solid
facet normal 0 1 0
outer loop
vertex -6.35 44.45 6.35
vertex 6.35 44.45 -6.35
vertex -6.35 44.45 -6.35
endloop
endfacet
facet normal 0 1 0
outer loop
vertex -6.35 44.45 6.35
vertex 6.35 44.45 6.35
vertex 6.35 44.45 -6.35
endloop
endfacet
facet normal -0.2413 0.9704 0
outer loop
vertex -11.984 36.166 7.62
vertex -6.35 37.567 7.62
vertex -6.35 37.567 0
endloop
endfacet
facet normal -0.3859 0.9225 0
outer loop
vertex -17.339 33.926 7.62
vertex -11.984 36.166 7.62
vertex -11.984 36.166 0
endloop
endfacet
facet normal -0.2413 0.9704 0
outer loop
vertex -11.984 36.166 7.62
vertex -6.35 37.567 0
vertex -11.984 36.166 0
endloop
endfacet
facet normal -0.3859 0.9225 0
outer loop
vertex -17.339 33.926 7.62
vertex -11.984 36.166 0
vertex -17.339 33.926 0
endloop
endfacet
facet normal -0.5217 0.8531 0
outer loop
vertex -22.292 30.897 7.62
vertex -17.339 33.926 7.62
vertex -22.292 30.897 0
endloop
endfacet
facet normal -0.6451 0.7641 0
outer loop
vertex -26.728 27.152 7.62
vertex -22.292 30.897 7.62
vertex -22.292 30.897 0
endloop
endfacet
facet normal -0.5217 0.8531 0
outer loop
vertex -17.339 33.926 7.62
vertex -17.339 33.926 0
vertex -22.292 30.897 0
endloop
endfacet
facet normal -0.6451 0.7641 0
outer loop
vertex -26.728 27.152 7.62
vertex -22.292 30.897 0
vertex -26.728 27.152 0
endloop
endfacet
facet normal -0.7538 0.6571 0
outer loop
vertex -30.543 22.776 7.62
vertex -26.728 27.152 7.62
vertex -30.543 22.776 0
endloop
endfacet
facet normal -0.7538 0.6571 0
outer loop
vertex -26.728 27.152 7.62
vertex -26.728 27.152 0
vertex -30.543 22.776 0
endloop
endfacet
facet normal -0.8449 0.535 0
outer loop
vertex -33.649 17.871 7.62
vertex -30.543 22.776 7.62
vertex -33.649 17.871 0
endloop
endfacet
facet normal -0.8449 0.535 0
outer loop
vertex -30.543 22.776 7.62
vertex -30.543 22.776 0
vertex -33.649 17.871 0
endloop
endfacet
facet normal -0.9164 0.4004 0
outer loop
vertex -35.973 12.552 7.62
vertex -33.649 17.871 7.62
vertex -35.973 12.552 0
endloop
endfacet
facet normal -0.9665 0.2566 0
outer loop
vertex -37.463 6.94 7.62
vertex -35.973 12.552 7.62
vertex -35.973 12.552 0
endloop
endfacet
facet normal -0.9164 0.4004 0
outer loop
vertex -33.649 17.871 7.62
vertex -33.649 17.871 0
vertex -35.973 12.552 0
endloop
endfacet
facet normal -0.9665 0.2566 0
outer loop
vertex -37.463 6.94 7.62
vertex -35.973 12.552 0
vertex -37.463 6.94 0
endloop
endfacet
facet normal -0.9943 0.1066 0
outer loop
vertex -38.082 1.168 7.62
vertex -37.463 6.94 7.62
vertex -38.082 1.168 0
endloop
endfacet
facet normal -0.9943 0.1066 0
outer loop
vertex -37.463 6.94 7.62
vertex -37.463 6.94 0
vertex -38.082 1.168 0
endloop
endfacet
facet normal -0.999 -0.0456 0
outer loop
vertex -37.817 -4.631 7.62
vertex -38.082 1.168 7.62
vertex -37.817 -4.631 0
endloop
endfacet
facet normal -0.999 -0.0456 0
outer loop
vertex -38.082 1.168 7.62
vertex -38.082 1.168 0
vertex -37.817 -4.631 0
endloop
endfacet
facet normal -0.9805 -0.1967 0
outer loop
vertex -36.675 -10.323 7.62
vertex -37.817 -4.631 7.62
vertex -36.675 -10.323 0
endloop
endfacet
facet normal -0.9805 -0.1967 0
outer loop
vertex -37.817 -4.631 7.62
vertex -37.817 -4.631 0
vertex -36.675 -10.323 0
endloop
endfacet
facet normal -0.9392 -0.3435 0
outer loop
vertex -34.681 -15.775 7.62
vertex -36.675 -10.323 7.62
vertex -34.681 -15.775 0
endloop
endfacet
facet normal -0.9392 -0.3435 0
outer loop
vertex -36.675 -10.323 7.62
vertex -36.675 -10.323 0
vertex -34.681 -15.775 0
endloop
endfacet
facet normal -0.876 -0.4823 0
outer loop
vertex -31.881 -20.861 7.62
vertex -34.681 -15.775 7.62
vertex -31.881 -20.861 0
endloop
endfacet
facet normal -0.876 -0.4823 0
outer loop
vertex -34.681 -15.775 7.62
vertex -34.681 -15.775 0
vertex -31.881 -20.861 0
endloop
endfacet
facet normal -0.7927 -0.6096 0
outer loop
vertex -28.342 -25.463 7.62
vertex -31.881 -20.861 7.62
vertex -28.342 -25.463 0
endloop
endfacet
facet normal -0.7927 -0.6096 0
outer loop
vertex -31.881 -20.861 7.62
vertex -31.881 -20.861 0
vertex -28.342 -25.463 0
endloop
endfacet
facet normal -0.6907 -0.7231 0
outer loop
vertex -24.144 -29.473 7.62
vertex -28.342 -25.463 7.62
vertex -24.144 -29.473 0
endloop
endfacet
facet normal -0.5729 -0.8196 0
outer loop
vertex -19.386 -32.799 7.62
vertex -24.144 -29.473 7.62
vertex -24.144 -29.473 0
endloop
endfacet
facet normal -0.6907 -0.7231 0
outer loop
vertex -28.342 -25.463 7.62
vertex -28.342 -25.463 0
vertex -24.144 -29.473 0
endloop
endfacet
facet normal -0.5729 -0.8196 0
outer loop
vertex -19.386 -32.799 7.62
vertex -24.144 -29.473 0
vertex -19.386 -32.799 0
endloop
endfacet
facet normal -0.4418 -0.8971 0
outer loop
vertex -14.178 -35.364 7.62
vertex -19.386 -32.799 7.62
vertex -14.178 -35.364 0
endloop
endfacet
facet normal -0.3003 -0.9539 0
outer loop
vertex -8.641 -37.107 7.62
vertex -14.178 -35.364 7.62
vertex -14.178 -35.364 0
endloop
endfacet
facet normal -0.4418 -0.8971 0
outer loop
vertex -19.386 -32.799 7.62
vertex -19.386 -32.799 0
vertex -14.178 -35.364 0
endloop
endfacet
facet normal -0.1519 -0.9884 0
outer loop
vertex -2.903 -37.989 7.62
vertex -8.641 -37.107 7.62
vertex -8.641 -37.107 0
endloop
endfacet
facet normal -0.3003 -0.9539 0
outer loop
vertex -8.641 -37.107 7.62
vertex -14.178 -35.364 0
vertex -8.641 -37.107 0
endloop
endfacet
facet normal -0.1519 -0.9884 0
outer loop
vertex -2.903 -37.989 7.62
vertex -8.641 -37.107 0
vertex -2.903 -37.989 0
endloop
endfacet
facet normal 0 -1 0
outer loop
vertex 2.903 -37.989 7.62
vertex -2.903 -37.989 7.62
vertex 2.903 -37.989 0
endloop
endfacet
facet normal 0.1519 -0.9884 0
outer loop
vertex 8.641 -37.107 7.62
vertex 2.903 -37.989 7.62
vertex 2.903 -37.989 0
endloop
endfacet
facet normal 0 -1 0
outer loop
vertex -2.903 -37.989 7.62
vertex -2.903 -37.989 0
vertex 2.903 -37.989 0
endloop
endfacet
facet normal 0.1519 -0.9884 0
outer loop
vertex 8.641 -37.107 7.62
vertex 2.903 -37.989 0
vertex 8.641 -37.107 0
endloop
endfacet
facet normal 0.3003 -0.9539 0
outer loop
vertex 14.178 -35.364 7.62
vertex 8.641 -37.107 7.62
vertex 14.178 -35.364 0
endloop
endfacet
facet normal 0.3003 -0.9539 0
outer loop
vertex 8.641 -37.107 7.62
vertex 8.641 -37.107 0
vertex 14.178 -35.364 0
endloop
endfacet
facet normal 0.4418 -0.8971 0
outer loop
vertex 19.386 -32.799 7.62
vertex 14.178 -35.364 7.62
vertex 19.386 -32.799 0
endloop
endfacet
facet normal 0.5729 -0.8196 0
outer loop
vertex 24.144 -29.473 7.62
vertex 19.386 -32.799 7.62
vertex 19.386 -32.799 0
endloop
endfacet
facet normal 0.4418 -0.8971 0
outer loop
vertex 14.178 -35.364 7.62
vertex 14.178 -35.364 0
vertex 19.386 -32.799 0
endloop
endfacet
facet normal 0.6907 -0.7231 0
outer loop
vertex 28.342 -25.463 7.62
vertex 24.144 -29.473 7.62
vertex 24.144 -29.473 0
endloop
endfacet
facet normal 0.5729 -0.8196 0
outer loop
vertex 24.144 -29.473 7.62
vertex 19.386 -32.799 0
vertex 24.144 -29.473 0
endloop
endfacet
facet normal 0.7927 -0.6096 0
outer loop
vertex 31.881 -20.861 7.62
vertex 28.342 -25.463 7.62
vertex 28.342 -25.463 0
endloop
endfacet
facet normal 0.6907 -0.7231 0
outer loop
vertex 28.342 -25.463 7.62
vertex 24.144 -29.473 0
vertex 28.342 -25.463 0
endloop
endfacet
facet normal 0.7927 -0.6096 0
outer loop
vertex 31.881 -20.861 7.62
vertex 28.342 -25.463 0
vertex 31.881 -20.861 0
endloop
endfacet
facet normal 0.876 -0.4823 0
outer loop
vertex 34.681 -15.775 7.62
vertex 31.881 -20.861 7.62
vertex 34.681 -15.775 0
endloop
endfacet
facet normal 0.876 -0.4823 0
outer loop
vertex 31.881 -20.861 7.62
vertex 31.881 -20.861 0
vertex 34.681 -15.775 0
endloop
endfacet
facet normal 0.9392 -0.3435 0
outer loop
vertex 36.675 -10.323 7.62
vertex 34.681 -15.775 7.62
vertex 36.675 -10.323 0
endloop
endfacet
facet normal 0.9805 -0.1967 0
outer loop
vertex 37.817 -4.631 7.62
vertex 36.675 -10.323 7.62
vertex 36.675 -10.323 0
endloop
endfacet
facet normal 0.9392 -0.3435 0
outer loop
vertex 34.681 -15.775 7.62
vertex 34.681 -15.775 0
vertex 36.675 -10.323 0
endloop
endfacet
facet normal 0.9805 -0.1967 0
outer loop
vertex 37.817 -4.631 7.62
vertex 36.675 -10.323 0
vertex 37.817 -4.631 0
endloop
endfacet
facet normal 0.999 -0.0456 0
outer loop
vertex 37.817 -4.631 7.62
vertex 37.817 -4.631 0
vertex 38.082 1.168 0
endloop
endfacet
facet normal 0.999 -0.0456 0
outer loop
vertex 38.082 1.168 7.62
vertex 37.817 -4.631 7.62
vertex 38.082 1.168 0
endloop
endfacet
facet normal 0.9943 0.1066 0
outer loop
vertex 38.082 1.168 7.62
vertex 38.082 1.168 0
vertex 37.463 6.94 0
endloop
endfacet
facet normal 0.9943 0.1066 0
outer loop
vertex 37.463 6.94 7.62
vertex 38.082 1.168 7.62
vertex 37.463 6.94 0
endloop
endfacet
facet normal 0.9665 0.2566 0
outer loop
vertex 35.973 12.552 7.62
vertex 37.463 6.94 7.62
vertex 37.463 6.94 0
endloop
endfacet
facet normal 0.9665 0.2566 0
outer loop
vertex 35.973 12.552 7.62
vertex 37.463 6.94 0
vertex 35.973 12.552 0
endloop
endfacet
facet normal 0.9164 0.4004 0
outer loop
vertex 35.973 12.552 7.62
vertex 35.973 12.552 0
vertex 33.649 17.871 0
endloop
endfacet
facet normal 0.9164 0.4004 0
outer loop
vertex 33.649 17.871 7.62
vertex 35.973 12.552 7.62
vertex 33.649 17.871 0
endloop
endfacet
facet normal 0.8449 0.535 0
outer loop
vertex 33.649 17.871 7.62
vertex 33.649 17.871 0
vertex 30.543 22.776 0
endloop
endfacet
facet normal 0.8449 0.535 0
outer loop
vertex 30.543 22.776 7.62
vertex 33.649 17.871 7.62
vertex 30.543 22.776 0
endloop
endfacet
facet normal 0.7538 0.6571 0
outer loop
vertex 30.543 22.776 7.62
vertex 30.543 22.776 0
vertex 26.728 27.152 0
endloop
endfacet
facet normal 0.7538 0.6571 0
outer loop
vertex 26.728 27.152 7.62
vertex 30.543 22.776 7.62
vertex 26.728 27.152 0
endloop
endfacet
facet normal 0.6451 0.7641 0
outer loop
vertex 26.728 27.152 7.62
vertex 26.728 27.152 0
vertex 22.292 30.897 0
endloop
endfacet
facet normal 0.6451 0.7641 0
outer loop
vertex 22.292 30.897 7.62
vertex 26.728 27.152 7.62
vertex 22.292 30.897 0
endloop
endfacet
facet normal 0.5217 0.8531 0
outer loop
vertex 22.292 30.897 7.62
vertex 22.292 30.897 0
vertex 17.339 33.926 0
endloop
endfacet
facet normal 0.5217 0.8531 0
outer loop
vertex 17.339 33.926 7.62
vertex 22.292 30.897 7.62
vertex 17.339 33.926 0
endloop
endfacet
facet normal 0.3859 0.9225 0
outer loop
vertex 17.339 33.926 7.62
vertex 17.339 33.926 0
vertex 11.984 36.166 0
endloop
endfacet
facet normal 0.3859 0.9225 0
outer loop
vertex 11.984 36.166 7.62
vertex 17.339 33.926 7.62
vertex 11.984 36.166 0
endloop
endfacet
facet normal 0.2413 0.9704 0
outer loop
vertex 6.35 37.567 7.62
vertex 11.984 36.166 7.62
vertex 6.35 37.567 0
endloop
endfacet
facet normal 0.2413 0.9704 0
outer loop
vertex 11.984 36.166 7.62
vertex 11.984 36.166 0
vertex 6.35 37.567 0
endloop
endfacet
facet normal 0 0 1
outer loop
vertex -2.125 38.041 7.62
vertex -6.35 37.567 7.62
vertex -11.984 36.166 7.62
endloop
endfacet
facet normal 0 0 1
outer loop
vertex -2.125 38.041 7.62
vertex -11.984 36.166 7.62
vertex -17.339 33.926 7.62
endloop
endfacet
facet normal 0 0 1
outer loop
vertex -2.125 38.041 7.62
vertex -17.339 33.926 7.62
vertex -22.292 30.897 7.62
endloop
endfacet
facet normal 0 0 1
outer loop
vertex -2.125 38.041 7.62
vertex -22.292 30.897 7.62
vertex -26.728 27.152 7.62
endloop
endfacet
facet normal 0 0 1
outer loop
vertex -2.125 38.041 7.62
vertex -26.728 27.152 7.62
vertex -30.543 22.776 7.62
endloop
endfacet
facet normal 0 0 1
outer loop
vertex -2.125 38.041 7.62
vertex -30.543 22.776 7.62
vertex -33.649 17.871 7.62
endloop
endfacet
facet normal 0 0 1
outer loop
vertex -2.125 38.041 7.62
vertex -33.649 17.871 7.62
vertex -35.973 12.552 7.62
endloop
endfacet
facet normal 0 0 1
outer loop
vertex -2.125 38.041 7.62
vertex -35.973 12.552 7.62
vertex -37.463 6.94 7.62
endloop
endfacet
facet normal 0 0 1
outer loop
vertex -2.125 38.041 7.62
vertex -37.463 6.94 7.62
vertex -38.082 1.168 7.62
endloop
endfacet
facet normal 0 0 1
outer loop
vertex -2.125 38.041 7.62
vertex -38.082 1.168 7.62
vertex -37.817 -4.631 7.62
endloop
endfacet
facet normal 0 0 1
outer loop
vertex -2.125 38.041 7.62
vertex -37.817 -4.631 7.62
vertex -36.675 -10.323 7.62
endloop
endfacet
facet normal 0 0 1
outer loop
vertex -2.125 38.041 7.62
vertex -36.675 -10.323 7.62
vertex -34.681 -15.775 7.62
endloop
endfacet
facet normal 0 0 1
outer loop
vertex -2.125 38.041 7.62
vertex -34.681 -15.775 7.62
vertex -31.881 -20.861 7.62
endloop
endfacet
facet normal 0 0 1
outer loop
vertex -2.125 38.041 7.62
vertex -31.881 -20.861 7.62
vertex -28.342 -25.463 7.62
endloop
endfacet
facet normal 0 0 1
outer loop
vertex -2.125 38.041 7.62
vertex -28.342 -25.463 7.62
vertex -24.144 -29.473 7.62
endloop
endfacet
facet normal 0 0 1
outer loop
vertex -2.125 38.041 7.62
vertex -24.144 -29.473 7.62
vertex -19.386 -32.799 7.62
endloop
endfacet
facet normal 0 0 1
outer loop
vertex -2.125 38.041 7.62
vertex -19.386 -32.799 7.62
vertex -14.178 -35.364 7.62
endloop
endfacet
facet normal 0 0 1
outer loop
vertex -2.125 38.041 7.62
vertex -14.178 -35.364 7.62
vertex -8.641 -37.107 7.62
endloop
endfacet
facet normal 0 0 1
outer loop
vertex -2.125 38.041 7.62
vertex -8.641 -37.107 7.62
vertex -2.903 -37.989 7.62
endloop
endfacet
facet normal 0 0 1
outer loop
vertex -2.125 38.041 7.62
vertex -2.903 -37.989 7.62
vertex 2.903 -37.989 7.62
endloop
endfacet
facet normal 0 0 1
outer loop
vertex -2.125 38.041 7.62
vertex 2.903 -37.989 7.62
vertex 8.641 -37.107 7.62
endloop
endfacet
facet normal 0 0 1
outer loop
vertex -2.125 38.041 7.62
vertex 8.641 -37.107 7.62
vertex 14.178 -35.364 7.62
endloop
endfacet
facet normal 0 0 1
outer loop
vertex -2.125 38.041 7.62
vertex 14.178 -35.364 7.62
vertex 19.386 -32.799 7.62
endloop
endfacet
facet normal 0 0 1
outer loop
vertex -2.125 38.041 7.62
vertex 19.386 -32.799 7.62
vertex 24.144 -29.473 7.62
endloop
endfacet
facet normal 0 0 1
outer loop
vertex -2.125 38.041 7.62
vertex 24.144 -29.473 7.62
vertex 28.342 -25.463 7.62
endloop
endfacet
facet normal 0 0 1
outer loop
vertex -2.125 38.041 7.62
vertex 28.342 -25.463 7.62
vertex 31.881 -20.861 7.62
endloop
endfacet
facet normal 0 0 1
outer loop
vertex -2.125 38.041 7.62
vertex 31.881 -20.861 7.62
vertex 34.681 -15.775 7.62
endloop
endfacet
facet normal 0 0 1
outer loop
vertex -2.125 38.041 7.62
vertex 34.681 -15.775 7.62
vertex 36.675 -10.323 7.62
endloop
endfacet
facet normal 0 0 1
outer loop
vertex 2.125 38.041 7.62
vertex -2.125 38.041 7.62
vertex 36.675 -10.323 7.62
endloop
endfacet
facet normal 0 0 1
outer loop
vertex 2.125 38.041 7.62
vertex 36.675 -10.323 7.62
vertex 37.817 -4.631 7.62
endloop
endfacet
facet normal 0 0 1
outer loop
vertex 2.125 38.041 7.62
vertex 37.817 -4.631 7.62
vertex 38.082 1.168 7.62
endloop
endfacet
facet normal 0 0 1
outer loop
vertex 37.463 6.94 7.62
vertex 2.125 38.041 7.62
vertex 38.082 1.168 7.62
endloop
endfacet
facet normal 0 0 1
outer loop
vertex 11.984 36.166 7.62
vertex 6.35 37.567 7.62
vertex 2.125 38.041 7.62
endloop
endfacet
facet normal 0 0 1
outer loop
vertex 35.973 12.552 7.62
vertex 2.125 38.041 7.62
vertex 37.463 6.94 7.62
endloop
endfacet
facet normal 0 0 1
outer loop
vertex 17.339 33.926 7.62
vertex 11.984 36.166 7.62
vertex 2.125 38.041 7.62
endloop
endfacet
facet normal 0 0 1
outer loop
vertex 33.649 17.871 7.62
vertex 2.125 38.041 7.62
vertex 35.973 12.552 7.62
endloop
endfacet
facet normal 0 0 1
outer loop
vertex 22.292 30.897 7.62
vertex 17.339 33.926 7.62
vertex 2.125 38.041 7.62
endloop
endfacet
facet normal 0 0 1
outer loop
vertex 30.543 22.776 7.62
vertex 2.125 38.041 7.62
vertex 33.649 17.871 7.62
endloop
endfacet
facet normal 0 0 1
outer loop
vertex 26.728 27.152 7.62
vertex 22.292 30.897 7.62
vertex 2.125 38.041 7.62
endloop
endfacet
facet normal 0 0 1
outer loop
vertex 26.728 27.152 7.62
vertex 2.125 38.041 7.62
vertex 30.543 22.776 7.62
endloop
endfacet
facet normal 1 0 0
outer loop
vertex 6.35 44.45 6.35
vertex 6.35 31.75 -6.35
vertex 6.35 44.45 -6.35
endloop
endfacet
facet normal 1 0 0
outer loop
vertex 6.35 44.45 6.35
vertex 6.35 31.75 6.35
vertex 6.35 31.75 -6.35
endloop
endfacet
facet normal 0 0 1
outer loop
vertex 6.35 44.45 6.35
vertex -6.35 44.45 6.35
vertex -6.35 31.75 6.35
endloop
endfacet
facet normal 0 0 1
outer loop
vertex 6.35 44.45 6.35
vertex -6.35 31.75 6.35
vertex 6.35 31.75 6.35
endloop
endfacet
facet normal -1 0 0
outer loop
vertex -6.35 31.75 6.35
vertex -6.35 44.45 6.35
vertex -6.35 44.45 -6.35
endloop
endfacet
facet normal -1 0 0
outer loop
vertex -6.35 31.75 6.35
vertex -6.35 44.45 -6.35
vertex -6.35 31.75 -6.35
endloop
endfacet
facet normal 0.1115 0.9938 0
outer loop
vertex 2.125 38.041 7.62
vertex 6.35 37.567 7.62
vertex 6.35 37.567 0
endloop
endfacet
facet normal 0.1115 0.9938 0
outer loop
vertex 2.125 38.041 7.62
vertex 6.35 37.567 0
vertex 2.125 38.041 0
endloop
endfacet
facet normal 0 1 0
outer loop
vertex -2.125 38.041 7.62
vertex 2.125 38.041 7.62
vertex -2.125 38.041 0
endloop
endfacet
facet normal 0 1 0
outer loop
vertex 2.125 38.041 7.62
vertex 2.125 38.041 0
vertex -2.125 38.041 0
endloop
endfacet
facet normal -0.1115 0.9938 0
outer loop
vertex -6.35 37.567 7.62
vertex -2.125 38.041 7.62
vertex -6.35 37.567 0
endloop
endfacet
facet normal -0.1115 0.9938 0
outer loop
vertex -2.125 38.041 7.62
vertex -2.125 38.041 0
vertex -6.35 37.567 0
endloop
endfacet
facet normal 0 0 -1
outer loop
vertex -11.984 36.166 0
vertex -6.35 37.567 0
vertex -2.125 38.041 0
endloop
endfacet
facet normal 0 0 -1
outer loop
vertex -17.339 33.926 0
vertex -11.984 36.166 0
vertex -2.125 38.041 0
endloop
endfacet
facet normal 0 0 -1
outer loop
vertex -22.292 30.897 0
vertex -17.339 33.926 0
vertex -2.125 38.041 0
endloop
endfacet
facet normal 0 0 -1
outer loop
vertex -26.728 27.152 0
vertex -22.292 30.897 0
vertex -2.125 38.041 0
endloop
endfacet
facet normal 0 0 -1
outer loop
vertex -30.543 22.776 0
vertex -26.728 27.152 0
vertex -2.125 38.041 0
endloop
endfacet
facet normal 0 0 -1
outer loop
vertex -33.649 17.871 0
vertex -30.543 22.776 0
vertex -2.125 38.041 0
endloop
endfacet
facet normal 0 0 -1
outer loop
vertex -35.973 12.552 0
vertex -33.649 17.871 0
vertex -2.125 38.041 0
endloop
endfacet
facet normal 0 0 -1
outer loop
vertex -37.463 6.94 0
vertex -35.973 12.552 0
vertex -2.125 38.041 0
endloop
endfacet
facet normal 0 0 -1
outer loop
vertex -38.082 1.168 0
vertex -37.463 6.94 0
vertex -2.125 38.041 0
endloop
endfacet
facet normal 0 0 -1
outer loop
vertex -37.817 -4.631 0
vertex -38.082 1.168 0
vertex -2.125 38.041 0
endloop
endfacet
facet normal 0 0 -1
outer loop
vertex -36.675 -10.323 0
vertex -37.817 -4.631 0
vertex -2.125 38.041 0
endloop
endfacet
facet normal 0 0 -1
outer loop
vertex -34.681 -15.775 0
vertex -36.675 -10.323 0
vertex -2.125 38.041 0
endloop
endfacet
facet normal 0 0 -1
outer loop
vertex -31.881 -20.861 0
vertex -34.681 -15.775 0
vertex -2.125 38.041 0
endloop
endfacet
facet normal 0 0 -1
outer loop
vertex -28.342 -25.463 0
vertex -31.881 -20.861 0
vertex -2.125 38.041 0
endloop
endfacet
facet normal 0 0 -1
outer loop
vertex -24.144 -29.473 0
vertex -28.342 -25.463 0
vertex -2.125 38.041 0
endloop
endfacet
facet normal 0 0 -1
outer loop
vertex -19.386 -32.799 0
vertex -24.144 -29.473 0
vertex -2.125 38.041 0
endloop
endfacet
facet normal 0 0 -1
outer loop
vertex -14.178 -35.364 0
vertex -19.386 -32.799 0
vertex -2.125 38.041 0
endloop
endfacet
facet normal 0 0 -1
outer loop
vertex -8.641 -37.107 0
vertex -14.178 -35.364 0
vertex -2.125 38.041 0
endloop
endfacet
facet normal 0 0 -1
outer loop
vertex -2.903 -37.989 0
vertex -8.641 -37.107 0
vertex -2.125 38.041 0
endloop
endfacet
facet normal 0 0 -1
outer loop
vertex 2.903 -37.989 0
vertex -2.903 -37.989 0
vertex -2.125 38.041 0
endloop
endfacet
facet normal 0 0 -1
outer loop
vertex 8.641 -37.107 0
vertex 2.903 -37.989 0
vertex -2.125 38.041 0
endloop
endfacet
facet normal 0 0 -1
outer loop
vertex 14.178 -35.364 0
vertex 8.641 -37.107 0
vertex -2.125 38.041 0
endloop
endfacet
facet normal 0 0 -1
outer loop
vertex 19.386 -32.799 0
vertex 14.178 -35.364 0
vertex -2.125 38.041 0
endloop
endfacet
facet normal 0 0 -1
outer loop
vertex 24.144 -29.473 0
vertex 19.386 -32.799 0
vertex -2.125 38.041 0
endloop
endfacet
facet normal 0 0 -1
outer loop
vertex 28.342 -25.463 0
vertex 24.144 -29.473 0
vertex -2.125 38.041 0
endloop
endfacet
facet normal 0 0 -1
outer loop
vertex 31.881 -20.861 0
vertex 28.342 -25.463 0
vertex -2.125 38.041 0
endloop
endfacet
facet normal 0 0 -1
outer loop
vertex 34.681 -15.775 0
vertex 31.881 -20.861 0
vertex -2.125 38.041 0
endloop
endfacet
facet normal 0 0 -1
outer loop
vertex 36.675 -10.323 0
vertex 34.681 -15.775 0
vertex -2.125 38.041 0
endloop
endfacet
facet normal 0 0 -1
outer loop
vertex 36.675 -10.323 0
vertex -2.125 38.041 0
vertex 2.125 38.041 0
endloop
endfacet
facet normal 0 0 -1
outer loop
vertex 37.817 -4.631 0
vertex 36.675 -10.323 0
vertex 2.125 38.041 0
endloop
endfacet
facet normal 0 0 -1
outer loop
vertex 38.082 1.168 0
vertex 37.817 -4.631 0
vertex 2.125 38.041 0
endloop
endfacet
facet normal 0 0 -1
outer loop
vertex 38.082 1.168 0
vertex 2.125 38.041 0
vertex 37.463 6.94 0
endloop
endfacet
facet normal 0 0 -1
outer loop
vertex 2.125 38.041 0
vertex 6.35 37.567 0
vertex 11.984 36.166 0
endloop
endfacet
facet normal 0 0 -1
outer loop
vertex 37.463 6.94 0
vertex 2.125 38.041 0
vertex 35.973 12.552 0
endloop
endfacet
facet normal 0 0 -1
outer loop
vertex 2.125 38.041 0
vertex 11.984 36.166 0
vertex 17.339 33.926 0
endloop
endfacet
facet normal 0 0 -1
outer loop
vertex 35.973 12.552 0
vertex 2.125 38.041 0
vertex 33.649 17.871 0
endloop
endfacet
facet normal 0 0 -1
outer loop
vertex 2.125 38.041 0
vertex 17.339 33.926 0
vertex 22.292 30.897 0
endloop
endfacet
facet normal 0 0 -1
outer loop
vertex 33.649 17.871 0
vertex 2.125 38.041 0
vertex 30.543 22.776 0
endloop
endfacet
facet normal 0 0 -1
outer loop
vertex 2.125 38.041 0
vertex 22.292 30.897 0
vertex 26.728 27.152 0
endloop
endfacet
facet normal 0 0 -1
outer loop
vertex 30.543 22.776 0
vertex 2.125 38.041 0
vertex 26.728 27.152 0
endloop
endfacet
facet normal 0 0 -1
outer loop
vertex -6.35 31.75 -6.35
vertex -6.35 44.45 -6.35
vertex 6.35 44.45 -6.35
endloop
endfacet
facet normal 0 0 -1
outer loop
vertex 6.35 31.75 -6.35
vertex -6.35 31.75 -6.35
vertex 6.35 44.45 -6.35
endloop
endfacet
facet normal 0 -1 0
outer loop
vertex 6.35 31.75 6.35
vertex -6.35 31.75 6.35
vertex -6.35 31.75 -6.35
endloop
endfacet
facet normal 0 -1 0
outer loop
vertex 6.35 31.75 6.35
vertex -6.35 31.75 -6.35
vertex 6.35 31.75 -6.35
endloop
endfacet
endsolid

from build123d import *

# Parameters (mm, degrees)
F1_DEPTH = 7.62
F2_DEPTH = 6.35


with BuildPart() as f1:
    # F0 (on Top) → F1 (new body)
    with BuildSketch(Plane.XY):
        with BuildLine():
            Line((6.35, 31.75), (6.35, 37.5671066227))
            ThreePointArc((6.35, 37.5671066227), (0, 38.1), (-6.35, 37.5671066227))
            Line((-6.35, 37.5671066227), (-6.35, 31.75))
            Line((-6.35, 31.75), (6.35, 31.75))
        make_face()
        with BuildLine():
            ThreePointArc((-6.35, 37.5671066227), (-24.5934442484, -29.099355663), (38.1, 0))
            ThreePointArc((38.1, 0), (29.099355663, 24.5934442484), (6.35, 37.5671066227))
            Line((6.35, 37.5671066227), (6.35, 31.75))
            Line((6.35, 31.75), (-6.35, 31.75))
            Line((-6.35, 31.75), (-6.35, 37.5671066227))
        make_face()
    extrude(amount=F1_DEPTH)


with BuildPart() as f2:
    # F0 (on Top) → F2 (new body, symmetric)
    with BuildSketch(Plane.XY):
        with BuildLine():
            ThreePointArc((-6.35, 37.5671066227), (0, 38.1), (6.35, 37.5671066227))
            Line((6.35, 37.5671066227), (6.35, 44.45))
            Line((6.35, 44.45), (-6.35, 44.45))
            Line((-6.35, 44.45), (-6.35, 37.5671066227))
        make_face()
        with BuildLine():
            Line((6.35, 31.75), (6.35, 37.5671066227))
            ThreePointArc((6.35, 37.5671066227), (0, 38.1), (-6.35, 37.5671066227))
            Line((-6.35, 37.5671066227), (-6.35, 31.75))
            Line((-6.35, 31.75), (6.35, 31.75))
        make_face()
    extrude(amount=F2_DEPTH, both=True)


solid = Compound([f1.part, f2.part])
